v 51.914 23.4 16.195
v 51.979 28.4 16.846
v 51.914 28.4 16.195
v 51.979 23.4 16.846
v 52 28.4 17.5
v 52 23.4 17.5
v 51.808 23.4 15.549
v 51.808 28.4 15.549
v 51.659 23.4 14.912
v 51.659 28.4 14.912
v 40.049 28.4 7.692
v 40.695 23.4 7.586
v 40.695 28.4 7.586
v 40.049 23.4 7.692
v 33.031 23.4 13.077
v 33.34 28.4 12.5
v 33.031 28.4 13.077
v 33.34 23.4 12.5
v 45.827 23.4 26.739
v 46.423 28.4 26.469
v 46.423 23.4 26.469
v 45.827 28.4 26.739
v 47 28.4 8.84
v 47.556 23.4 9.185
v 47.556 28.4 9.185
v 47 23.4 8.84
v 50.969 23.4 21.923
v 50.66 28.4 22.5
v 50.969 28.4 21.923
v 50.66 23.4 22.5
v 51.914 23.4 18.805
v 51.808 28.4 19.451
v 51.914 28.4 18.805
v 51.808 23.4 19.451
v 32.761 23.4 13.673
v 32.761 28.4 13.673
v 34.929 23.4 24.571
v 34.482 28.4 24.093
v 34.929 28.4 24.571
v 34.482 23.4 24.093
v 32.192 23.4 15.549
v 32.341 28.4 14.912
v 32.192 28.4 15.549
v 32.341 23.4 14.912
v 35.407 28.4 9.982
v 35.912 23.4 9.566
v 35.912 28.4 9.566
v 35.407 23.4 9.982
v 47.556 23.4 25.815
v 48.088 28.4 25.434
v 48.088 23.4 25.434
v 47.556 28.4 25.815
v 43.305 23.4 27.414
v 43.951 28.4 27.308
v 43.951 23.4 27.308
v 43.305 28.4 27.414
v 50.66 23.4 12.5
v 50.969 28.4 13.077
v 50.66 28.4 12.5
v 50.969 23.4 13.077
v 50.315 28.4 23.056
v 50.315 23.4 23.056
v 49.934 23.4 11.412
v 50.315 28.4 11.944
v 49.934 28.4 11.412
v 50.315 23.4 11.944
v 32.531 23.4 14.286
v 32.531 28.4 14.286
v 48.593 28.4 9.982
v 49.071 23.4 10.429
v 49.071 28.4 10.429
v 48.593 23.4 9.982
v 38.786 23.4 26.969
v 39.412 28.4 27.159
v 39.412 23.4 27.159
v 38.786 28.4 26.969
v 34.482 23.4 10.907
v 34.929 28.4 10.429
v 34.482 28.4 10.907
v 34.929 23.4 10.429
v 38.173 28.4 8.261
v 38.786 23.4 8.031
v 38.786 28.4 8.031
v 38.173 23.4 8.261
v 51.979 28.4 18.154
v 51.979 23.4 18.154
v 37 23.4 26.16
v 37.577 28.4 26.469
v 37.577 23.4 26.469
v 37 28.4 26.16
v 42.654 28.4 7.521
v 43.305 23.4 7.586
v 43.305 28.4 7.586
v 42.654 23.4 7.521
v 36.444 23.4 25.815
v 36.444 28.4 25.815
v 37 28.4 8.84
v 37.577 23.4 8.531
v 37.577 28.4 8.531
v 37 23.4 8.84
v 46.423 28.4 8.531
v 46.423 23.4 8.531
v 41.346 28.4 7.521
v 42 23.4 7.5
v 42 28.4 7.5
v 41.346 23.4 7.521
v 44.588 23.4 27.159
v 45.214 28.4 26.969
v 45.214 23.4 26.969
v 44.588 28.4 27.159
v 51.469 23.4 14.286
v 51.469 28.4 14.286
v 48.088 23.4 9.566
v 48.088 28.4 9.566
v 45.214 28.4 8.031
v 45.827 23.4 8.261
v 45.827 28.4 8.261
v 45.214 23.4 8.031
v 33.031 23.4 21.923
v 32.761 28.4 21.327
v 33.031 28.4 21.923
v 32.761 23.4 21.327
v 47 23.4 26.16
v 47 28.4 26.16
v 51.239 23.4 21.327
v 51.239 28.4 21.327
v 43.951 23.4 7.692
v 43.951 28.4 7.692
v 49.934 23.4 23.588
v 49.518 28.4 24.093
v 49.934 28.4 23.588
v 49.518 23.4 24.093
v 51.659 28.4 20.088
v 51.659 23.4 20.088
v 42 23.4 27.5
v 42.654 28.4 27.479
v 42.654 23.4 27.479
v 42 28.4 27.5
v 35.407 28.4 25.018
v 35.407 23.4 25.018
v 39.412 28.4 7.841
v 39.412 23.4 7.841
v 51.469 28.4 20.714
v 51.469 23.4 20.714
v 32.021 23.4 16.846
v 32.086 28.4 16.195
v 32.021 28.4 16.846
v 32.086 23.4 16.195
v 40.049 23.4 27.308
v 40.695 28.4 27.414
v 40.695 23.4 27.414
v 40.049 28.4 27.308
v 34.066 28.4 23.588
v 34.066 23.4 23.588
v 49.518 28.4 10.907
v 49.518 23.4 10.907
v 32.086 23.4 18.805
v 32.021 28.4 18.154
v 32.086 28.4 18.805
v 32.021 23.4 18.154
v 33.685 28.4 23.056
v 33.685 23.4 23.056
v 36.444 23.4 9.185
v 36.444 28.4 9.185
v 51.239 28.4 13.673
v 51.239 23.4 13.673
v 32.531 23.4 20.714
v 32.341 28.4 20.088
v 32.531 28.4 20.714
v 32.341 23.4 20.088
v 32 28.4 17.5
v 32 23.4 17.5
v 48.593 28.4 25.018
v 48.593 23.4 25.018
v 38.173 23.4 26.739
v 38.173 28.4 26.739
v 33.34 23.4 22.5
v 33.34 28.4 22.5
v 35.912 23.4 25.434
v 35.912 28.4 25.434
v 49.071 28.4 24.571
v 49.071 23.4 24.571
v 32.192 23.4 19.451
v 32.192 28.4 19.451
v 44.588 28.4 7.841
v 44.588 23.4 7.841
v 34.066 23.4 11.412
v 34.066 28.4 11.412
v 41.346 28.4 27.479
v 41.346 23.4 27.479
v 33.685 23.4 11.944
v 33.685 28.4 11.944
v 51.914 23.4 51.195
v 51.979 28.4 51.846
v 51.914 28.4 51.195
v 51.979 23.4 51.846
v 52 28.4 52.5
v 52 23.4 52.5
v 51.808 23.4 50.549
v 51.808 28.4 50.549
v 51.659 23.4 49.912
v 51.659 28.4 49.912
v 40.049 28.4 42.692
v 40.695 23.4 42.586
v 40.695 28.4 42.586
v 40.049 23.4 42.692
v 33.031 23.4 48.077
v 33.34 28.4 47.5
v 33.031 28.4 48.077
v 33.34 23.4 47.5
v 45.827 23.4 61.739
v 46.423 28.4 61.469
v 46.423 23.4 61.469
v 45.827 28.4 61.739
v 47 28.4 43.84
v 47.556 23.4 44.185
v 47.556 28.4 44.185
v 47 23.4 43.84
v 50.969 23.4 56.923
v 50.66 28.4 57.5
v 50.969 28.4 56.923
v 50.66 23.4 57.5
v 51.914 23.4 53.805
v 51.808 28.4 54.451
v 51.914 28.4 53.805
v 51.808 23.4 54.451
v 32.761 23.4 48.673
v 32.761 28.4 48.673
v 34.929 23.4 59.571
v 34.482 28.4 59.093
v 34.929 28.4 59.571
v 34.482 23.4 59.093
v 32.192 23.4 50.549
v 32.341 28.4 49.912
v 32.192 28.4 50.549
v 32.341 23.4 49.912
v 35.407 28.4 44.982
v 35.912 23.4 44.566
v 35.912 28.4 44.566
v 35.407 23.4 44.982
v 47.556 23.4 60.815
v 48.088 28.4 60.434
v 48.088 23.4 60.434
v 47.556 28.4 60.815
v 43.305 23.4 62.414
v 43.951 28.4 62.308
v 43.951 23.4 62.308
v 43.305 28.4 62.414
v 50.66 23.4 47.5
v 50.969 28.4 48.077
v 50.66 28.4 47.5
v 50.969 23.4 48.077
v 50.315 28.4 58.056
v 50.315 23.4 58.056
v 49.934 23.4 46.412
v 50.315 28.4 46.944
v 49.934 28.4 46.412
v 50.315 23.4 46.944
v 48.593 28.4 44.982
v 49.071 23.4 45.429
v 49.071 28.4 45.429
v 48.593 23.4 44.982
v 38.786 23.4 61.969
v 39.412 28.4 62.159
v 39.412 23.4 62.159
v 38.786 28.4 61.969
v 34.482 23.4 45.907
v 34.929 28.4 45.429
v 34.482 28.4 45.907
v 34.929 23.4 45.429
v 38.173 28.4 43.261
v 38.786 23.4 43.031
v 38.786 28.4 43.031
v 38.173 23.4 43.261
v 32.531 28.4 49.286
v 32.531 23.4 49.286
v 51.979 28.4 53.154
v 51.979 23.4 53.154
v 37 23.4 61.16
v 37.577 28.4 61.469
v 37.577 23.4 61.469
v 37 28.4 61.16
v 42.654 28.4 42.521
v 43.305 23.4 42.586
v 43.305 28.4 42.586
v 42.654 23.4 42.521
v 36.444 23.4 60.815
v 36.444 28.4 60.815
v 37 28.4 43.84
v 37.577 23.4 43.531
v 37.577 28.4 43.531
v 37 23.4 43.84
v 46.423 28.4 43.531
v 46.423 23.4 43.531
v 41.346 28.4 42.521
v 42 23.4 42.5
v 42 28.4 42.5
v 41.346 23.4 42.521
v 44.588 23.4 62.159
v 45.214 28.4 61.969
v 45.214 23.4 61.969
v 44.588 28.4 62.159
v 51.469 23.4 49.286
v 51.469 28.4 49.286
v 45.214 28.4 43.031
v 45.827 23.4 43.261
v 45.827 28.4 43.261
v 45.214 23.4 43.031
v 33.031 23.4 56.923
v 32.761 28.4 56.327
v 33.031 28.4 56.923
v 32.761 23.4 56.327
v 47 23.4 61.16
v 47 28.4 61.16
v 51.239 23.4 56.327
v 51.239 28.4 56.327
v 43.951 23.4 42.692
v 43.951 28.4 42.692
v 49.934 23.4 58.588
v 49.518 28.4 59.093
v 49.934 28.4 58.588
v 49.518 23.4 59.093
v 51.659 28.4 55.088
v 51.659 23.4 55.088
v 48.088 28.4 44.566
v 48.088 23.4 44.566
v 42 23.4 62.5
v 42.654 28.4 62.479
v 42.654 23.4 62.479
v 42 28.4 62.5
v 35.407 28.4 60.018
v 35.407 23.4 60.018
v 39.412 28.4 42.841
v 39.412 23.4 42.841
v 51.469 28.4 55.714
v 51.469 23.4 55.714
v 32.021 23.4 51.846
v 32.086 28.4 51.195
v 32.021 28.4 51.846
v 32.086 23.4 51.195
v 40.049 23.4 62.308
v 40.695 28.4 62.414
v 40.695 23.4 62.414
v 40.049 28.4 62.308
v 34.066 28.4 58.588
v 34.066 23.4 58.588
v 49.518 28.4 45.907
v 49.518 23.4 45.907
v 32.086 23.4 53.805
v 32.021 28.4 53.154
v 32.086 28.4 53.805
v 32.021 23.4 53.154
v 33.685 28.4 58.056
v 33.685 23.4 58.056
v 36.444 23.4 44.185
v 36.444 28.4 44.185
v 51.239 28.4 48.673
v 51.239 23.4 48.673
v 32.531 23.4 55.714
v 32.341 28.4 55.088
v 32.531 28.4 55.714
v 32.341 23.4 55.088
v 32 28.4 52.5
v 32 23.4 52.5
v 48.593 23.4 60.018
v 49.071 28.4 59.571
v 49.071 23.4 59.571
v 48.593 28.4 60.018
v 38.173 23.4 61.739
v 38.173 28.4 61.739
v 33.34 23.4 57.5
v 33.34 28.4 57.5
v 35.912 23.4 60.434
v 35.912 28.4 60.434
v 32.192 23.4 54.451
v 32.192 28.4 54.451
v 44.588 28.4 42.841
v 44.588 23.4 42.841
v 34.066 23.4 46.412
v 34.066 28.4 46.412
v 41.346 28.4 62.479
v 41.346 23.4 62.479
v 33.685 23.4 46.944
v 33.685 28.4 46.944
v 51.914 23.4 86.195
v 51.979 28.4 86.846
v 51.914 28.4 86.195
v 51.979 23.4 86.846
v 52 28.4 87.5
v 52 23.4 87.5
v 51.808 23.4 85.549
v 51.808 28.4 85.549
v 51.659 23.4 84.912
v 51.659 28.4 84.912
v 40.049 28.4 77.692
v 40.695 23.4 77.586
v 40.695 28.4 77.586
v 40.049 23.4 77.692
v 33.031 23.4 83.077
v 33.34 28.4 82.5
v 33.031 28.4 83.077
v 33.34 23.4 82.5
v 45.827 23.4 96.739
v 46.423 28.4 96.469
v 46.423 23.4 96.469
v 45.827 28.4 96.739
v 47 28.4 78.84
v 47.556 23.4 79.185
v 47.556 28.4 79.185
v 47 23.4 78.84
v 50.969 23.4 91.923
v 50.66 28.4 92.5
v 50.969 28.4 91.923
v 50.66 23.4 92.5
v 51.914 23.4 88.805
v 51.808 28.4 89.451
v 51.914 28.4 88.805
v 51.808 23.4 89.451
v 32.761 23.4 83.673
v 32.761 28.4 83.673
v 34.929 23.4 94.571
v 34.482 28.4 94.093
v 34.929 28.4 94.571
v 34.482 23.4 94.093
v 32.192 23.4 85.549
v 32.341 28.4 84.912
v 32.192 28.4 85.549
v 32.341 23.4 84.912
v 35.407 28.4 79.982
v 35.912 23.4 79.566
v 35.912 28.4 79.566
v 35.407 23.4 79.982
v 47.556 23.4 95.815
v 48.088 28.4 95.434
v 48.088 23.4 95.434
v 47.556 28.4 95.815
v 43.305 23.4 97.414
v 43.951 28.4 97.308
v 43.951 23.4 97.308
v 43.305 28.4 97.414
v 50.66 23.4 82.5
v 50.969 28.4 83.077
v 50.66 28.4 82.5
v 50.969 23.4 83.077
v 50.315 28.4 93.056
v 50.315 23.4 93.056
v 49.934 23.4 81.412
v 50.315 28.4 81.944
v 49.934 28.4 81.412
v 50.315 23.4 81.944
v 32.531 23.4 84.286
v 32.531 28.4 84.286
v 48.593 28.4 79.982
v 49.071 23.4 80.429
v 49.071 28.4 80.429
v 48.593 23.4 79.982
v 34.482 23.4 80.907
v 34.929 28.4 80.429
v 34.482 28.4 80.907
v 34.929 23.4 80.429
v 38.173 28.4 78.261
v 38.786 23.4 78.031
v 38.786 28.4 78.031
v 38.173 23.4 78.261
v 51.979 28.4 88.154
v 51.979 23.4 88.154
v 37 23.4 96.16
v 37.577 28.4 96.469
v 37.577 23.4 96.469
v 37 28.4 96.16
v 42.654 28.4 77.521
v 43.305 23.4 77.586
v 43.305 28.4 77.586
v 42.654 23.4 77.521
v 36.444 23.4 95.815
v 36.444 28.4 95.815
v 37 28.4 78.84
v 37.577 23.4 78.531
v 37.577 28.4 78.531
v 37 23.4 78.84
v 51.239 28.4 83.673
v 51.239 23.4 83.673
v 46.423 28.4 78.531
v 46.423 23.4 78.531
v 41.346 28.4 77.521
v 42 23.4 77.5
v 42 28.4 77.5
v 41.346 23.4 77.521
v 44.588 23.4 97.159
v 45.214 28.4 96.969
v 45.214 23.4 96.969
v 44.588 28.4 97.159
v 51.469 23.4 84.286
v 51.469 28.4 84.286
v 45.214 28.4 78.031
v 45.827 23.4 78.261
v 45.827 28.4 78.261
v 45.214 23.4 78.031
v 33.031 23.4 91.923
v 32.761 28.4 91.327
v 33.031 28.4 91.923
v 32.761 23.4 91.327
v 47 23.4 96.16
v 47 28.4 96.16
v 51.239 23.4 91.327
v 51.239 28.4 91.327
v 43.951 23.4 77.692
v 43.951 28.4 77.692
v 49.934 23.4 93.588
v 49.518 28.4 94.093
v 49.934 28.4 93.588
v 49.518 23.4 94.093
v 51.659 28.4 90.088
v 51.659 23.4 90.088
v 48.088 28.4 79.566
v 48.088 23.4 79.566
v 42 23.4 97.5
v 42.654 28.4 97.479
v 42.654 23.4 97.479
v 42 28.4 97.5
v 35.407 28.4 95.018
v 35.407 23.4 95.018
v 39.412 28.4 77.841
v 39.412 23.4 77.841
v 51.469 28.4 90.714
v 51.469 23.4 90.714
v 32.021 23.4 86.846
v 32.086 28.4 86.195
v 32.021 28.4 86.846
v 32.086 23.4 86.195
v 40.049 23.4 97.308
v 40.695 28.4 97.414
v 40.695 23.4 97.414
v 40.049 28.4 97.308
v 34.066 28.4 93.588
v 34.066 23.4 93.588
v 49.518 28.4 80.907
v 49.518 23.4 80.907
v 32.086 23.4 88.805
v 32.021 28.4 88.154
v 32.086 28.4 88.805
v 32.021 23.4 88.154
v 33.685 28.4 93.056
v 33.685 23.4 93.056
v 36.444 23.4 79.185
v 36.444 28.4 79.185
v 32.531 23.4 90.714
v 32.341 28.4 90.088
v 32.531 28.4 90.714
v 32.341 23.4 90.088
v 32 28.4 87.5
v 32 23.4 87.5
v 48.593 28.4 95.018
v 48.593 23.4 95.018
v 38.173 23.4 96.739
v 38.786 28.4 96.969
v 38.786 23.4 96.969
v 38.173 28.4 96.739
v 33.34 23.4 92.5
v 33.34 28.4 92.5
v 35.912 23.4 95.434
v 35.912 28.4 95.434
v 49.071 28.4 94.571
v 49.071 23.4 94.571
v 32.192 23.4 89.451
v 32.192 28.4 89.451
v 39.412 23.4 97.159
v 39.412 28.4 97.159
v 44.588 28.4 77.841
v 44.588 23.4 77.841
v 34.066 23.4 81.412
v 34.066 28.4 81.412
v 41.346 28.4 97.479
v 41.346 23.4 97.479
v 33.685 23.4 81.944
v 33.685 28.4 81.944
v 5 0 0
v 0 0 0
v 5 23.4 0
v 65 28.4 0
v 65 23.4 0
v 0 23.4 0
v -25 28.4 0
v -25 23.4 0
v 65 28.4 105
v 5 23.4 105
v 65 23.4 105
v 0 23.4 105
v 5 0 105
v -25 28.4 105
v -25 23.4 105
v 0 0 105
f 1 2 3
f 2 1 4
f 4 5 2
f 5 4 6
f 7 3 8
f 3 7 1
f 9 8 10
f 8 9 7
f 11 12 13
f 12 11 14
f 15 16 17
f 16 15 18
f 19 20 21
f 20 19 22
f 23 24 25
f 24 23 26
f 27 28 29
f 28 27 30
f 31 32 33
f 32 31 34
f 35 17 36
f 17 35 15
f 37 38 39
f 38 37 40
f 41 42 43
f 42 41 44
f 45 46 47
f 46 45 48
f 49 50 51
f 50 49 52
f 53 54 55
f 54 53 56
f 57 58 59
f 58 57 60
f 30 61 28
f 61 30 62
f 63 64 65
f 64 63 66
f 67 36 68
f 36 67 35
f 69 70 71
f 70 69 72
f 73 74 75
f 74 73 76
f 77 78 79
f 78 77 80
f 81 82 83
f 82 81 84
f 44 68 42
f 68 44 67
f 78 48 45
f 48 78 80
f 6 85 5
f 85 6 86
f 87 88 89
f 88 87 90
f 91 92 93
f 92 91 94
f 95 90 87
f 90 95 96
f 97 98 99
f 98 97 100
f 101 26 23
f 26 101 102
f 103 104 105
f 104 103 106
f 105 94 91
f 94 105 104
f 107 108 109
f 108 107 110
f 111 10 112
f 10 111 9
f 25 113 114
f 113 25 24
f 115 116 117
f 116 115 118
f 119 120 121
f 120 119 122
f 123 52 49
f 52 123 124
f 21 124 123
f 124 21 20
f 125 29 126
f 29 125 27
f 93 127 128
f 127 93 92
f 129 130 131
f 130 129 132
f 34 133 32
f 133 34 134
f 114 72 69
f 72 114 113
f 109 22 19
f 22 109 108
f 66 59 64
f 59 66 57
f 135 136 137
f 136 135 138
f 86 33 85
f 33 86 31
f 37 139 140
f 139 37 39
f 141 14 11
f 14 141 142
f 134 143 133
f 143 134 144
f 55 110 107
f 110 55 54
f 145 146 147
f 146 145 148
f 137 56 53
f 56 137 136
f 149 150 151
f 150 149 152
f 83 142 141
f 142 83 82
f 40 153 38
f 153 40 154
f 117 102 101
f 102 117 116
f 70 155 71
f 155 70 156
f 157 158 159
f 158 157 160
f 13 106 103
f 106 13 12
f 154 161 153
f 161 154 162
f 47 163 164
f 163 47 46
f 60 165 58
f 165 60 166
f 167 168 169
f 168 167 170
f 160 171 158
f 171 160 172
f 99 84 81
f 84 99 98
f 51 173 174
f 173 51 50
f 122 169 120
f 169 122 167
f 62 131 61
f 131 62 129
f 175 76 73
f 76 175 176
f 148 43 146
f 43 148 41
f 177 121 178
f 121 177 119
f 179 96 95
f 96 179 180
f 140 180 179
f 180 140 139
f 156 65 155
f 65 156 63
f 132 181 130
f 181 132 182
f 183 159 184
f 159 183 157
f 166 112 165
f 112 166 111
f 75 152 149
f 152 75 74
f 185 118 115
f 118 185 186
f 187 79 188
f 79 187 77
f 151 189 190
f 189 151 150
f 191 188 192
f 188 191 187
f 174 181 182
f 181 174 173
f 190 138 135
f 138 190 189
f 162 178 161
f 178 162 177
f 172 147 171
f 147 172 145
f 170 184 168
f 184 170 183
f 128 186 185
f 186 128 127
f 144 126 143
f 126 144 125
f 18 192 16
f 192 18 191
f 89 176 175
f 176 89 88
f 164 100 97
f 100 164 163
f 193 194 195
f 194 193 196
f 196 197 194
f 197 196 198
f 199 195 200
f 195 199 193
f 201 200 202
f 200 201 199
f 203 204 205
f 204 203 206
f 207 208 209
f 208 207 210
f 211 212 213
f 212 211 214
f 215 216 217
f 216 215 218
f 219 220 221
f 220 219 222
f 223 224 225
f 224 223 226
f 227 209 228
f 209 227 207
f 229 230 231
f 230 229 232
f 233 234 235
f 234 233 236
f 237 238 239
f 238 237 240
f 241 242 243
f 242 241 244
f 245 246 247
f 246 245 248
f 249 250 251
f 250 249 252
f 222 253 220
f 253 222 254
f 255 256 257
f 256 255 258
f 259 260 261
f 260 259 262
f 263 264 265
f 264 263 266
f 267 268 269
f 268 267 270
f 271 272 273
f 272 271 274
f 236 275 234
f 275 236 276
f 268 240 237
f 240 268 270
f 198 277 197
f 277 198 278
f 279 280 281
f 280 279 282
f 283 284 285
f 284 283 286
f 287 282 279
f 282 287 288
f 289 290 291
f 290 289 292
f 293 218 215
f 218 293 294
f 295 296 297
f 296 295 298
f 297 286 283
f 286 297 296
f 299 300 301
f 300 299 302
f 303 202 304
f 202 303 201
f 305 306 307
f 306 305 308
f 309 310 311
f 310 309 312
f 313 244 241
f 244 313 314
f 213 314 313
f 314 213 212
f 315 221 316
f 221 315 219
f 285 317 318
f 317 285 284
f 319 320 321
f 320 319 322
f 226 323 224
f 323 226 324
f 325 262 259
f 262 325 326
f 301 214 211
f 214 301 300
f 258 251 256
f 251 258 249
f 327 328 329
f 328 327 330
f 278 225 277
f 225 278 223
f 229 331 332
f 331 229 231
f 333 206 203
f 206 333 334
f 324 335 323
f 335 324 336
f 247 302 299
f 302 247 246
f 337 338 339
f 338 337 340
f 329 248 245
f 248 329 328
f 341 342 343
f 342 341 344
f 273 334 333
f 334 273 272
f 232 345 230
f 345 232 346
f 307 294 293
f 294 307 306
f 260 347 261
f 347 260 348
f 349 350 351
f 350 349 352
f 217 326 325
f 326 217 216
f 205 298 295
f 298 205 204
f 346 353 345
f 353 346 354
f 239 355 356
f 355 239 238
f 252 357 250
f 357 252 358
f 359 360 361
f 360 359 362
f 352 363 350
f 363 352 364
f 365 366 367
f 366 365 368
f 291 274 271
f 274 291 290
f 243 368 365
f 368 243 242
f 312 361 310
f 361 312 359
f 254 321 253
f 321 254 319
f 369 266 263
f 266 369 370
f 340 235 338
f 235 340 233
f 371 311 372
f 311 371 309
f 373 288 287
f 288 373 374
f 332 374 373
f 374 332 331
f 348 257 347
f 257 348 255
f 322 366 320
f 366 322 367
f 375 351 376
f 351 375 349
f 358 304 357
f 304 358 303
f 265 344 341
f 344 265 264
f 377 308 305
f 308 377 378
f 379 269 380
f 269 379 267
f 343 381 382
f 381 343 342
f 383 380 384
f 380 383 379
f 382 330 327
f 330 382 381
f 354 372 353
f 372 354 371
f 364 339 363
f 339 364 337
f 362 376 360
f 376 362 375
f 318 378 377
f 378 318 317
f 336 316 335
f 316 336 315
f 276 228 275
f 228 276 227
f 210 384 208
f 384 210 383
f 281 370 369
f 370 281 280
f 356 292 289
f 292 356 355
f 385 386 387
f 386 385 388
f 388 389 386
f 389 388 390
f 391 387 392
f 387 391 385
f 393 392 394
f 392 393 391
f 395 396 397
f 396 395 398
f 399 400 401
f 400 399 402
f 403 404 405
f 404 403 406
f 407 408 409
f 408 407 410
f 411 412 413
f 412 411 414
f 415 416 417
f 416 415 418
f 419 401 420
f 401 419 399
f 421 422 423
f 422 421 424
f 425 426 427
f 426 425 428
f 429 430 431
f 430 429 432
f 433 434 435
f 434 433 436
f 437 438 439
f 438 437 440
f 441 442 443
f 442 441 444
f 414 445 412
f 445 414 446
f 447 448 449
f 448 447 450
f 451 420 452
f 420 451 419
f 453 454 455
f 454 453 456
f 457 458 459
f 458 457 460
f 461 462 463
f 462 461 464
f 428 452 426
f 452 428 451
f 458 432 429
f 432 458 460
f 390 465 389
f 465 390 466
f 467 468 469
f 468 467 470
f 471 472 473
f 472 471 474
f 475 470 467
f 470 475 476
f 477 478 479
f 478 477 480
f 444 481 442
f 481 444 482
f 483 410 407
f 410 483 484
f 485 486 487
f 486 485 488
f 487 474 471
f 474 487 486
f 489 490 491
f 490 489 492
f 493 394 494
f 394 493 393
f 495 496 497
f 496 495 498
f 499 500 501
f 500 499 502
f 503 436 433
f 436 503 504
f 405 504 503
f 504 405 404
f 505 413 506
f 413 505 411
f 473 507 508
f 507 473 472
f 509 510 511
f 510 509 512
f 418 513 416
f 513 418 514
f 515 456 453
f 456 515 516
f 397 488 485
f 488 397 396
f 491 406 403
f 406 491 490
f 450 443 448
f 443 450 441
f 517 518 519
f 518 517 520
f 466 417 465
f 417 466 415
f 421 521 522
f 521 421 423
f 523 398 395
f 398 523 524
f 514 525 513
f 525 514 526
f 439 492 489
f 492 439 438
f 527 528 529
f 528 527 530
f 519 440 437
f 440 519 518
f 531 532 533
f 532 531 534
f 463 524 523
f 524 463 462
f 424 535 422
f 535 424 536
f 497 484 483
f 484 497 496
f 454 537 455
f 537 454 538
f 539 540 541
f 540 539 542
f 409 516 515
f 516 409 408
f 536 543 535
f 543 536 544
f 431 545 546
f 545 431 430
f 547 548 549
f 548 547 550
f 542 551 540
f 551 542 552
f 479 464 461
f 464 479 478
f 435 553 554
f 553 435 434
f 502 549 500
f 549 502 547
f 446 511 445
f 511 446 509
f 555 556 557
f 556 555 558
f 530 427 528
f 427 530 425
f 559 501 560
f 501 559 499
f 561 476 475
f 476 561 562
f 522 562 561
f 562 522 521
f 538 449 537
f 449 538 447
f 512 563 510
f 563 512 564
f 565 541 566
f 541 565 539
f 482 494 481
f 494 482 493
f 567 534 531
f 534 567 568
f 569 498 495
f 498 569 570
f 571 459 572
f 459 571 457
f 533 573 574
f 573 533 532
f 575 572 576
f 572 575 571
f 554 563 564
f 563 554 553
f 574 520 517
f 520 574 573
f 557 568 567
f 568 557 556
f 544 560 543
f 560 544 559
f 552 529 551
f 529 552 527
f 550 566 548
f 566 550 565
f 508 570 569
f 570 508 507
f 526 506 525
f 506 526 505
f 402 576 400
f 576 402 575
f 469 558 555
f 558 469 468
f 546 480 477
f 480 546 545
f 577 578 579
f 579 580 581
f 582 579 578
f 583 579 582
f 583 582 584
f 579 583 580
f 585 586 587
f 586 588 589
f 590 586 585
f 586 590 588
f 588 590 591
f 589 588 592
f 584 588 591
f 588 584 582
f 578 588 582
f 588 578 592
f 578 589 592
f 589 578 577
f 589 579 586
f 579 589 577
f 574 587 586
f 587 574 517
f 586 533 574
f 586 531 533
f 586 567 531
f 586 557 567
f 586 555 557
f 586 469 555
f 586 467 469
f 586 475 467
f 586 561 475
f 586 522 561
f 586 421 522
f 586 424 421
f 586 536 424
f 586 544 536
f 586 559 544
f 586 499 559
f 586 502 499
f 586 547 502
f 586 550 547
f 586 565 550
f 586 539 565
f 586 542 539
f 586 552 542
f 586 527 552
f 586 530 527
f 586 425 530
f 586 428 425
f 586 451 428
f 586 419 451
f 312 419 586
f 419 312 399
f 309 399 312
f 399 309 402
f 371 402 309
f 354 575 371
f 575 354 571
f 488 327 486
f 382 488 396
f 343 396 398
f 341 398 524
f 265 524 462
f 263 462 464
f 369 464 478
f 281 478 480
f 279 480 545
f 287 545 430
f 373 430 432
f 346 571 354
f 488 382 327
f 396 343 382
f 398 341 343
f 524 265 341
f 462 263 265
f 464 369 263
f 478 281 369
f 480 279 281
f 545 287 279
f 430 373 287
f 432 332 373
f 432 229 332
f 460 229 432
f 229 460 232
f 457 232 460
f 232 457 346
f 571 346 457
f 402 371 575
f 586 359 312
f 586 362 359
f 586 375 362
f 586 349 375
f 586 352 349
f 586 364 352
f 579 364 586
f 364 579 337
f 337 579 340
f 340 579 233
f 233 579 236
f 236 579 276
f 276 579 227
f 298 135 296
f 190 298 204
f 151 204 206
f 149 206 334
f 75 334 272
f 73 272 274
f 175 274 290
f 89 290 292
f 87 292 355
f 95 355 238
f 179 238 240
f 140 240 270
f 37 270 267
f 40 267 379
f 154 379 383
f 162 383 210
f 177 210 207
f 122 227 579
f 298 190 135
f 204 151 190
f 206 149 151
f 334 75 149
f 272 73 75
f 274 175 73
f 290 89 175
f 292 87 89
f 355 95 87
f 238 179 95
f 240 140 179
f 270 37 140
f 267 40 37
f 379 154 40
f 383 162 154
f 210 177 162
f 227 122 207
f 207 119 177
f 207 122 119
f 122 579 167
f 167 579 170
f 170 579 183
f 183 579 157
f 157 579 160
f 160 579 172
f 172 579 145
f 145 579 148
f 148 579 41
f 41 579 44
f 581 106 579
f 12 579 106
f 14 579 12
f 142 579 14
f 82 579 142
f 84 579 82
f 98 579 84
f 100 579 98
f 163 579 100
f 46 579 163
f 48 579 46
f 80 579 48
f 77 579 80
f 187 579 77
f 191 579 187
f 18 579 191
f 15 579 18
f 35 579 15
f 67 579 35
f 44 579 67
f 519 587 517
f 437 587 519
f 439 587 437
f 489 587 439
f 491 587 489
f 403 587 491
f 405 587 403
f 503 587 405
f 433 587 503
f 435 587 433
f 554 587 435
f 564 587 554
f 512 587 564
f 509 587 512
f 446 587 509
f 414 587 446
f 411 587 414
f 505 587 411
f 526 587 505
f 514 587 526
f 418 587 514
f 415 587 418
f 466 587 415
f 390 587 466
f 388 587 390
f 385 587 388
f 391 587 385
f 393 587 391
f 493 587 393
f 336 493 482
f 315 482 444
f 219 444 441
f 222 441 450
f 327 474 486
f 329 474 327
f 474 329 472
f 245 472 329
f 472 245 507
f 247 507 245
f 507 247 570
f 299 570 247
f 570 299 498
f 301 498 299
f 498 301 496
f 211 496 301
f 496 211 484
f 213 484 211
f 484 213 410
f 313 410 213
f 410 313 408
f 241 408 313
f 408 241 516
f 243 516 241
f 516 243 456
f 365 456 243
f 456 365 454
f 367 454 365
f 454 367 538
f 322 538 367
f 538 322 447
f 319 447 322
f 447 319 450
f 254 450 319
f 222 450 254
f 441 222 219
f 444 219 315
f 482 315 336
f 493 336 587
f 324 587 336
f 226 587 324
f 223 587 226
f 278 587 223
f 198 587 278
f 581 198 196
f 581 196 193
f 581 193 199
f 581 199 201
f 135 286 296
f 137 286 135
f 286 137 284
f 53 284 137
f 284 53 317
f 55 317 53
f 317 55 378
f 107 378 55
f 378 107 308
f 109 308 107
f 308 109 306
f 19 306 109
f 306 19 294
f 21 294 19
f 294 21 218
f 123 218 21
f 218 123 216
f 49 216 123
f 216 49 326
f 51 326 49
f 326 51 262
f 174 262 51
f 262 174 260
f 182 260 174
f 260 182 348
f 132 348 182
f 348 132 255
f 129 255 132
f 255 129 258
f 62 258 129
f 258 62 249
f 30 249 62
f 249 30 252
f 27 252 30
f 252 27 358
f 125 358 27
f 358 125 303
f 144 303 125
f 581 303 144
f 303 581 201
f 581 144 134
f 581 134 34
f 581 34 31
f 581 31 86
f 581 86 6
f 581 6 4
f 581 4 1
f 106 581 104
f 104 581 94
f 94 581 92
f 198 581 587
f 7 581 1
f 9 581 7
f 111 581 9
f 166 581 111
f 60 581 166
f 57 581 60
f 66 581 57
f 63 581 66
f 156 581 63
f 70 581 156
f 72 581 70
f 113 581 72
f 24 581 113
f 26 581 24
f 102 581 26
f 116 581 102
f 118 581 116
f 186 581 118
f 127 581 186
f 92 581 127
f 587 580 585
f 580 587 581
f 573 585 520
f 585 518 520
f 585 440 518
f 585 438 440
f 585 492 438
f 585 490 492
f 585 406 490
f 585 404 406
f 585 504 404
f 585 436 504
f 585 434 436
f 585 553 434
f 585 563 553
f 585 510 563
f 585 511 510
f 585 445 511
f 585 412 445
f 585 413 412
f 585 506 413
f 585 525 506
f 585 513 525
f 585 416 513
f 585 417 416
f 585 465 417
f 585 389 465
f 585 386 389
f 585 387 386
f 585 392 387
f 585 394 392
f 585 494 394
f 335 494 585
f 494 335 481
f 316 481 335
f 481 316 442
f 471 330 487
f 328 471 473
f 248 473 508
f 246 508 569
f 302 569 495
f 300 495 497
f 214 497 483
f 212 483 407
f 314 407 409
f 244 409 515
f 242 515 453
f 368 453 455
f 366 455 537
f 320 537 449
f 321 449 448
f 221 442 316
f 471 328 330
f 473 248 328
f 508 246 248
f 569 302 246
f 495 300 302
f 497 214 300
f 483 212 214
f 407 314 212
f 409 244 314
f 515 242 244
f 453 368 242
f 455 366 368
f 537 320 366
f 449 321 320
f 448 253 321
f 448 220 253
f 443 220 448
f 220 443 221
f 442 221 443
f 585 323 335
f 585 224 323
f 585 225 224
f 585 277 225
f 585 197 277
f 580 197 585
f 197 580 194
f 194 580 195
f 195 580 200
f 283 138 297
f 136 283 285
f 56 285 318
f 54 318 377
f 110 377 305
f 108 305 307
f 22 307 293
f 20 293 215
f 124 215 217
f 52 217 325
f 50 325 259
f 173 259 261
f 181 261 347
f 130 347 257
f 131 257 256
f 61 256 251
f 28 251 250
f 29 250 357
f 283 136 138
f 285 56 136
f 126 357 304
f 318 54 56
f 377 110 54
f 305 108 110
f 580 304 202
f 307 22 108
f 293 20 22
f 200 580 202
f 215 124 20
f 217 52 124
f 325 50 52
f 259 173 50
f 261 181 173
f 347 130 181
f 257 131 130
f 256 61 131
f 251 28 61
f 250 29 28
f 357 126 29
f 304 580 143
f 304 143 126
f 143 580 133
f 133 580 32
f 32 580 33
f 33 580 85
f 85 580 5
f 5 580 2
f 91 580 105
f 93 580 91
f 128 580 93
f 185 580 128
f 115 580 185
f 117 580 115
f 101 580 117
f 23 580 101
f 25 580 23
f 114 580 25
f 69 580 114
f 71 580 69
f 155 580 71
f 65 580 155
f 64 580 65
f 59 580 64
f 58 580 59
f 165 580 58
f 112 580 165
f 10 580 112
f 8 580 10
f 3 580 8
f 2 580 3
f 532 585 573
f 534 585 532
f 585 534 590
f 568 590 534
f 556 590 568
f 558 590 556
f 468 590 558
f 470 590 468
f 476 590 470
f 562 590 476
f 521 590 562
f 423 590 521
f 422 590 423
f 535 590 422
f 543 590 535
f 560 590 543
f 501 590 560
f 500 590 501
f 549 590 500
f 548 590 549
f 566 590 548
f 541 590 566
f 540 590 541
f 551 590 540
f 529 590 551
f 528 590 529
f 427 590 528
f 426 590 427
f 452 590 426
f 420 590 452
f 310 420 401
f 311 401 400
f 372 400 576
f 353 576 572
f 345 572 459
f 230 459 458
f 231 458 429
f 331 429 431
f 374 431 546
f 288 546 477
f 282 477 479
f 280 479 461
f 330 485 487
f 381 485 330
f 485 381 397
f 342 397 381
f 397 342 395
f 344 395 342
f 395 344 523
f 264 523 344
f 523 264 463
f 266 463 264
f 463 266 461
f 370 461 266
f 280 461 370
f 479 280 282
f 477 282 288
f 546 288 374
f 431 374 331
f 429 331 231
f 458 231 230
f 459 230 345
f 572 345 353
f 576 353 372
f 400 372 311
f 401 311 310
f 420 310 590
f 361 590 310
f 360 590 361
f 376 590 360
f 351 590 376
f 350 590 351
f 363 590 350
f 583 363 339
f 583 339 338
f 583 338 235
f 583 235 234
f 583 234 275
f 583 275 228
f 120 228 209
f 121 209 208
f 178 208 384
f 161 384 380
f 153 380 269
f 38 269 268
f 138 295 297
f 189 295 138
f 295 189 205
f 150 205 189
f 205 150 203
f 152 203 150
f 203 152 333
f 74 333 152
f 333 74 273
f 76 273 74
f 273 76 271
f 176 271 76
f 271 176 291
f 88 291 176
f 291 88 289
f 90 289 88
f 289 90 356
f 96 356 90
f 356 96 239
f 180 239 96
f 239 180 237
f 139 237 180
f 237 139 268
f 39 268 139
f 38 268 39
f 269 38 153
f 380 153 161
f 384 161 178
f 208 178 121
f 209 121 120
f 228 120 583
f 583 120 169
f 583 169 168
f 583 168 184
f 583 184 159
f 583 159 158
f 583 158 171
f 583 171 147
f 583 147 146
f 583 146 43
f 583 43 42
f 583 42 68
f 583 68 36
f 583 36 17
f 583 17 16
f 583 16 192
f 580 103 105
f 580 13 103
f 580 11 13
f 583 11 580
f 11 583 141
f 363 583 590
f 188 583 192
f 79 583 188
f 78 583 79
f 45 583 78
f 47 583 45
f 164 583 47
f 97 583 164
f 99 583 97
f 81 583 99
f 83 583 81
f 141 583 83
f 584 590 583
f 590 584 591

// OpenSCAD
// KNOWN-WRONG PART (must fail): no bottom jaw: a hook instead of a clamp
// Holder for 3 single-channel pipettes that clamps onto the front edge of an 18 mm shelf
// Category: quick fixes. A C-shaped clamp (spine, bottom jaw, top jaw) whose top jaw continues
// forward as an arm with three 20 mm holes; each pipette drops in and hangs by its handle.
// Modelled in print orientation: lying on its side, the profile in XY extruded along Z
// (in use +Y is up and +X points away from the shelf), so the jaws print as plain walls.
// Print: PETG (springier than PLA), 0.2 mm layers, 4 perimeters.
// SPDX-License-Identifier: CERN-OHL-P-2.0

/* [Holder] */
width = 105;              // extrusion length (along the shelf edge)
spine = [0, 5];           // x from, x to
jaw_back = -25;           // both jaws reach back to x = -25
jaw_t = 5;
gap = 18.4;               // 18 mm shelf + clearance
arm_front = 65;           // the top jaw continues forward to x = 65
hole_d = 20;
hole_x = 42;
hole_z = [17.5, 52.5, 87.5];

/* [Hidden] */
eps = 0.01;
H = jaw_t + gap + jaw_t;  // 28.4

difference() {
    linear_extrude(width) union() {
        translate([spine[0], 0]) square([spine[1] - spine[0], H]);
        translate([jaw_back, H - jaw_t]) square([arm_front - jaw_back, jaw_t]);
    }
    for (z = hole_z)
        translate([hole_x, H - jaw_t - 1, z]) rotate([-90, 0, 0]) cylinder(d = hole_d, h = jaw_t + 2, $fn = 96);
}
